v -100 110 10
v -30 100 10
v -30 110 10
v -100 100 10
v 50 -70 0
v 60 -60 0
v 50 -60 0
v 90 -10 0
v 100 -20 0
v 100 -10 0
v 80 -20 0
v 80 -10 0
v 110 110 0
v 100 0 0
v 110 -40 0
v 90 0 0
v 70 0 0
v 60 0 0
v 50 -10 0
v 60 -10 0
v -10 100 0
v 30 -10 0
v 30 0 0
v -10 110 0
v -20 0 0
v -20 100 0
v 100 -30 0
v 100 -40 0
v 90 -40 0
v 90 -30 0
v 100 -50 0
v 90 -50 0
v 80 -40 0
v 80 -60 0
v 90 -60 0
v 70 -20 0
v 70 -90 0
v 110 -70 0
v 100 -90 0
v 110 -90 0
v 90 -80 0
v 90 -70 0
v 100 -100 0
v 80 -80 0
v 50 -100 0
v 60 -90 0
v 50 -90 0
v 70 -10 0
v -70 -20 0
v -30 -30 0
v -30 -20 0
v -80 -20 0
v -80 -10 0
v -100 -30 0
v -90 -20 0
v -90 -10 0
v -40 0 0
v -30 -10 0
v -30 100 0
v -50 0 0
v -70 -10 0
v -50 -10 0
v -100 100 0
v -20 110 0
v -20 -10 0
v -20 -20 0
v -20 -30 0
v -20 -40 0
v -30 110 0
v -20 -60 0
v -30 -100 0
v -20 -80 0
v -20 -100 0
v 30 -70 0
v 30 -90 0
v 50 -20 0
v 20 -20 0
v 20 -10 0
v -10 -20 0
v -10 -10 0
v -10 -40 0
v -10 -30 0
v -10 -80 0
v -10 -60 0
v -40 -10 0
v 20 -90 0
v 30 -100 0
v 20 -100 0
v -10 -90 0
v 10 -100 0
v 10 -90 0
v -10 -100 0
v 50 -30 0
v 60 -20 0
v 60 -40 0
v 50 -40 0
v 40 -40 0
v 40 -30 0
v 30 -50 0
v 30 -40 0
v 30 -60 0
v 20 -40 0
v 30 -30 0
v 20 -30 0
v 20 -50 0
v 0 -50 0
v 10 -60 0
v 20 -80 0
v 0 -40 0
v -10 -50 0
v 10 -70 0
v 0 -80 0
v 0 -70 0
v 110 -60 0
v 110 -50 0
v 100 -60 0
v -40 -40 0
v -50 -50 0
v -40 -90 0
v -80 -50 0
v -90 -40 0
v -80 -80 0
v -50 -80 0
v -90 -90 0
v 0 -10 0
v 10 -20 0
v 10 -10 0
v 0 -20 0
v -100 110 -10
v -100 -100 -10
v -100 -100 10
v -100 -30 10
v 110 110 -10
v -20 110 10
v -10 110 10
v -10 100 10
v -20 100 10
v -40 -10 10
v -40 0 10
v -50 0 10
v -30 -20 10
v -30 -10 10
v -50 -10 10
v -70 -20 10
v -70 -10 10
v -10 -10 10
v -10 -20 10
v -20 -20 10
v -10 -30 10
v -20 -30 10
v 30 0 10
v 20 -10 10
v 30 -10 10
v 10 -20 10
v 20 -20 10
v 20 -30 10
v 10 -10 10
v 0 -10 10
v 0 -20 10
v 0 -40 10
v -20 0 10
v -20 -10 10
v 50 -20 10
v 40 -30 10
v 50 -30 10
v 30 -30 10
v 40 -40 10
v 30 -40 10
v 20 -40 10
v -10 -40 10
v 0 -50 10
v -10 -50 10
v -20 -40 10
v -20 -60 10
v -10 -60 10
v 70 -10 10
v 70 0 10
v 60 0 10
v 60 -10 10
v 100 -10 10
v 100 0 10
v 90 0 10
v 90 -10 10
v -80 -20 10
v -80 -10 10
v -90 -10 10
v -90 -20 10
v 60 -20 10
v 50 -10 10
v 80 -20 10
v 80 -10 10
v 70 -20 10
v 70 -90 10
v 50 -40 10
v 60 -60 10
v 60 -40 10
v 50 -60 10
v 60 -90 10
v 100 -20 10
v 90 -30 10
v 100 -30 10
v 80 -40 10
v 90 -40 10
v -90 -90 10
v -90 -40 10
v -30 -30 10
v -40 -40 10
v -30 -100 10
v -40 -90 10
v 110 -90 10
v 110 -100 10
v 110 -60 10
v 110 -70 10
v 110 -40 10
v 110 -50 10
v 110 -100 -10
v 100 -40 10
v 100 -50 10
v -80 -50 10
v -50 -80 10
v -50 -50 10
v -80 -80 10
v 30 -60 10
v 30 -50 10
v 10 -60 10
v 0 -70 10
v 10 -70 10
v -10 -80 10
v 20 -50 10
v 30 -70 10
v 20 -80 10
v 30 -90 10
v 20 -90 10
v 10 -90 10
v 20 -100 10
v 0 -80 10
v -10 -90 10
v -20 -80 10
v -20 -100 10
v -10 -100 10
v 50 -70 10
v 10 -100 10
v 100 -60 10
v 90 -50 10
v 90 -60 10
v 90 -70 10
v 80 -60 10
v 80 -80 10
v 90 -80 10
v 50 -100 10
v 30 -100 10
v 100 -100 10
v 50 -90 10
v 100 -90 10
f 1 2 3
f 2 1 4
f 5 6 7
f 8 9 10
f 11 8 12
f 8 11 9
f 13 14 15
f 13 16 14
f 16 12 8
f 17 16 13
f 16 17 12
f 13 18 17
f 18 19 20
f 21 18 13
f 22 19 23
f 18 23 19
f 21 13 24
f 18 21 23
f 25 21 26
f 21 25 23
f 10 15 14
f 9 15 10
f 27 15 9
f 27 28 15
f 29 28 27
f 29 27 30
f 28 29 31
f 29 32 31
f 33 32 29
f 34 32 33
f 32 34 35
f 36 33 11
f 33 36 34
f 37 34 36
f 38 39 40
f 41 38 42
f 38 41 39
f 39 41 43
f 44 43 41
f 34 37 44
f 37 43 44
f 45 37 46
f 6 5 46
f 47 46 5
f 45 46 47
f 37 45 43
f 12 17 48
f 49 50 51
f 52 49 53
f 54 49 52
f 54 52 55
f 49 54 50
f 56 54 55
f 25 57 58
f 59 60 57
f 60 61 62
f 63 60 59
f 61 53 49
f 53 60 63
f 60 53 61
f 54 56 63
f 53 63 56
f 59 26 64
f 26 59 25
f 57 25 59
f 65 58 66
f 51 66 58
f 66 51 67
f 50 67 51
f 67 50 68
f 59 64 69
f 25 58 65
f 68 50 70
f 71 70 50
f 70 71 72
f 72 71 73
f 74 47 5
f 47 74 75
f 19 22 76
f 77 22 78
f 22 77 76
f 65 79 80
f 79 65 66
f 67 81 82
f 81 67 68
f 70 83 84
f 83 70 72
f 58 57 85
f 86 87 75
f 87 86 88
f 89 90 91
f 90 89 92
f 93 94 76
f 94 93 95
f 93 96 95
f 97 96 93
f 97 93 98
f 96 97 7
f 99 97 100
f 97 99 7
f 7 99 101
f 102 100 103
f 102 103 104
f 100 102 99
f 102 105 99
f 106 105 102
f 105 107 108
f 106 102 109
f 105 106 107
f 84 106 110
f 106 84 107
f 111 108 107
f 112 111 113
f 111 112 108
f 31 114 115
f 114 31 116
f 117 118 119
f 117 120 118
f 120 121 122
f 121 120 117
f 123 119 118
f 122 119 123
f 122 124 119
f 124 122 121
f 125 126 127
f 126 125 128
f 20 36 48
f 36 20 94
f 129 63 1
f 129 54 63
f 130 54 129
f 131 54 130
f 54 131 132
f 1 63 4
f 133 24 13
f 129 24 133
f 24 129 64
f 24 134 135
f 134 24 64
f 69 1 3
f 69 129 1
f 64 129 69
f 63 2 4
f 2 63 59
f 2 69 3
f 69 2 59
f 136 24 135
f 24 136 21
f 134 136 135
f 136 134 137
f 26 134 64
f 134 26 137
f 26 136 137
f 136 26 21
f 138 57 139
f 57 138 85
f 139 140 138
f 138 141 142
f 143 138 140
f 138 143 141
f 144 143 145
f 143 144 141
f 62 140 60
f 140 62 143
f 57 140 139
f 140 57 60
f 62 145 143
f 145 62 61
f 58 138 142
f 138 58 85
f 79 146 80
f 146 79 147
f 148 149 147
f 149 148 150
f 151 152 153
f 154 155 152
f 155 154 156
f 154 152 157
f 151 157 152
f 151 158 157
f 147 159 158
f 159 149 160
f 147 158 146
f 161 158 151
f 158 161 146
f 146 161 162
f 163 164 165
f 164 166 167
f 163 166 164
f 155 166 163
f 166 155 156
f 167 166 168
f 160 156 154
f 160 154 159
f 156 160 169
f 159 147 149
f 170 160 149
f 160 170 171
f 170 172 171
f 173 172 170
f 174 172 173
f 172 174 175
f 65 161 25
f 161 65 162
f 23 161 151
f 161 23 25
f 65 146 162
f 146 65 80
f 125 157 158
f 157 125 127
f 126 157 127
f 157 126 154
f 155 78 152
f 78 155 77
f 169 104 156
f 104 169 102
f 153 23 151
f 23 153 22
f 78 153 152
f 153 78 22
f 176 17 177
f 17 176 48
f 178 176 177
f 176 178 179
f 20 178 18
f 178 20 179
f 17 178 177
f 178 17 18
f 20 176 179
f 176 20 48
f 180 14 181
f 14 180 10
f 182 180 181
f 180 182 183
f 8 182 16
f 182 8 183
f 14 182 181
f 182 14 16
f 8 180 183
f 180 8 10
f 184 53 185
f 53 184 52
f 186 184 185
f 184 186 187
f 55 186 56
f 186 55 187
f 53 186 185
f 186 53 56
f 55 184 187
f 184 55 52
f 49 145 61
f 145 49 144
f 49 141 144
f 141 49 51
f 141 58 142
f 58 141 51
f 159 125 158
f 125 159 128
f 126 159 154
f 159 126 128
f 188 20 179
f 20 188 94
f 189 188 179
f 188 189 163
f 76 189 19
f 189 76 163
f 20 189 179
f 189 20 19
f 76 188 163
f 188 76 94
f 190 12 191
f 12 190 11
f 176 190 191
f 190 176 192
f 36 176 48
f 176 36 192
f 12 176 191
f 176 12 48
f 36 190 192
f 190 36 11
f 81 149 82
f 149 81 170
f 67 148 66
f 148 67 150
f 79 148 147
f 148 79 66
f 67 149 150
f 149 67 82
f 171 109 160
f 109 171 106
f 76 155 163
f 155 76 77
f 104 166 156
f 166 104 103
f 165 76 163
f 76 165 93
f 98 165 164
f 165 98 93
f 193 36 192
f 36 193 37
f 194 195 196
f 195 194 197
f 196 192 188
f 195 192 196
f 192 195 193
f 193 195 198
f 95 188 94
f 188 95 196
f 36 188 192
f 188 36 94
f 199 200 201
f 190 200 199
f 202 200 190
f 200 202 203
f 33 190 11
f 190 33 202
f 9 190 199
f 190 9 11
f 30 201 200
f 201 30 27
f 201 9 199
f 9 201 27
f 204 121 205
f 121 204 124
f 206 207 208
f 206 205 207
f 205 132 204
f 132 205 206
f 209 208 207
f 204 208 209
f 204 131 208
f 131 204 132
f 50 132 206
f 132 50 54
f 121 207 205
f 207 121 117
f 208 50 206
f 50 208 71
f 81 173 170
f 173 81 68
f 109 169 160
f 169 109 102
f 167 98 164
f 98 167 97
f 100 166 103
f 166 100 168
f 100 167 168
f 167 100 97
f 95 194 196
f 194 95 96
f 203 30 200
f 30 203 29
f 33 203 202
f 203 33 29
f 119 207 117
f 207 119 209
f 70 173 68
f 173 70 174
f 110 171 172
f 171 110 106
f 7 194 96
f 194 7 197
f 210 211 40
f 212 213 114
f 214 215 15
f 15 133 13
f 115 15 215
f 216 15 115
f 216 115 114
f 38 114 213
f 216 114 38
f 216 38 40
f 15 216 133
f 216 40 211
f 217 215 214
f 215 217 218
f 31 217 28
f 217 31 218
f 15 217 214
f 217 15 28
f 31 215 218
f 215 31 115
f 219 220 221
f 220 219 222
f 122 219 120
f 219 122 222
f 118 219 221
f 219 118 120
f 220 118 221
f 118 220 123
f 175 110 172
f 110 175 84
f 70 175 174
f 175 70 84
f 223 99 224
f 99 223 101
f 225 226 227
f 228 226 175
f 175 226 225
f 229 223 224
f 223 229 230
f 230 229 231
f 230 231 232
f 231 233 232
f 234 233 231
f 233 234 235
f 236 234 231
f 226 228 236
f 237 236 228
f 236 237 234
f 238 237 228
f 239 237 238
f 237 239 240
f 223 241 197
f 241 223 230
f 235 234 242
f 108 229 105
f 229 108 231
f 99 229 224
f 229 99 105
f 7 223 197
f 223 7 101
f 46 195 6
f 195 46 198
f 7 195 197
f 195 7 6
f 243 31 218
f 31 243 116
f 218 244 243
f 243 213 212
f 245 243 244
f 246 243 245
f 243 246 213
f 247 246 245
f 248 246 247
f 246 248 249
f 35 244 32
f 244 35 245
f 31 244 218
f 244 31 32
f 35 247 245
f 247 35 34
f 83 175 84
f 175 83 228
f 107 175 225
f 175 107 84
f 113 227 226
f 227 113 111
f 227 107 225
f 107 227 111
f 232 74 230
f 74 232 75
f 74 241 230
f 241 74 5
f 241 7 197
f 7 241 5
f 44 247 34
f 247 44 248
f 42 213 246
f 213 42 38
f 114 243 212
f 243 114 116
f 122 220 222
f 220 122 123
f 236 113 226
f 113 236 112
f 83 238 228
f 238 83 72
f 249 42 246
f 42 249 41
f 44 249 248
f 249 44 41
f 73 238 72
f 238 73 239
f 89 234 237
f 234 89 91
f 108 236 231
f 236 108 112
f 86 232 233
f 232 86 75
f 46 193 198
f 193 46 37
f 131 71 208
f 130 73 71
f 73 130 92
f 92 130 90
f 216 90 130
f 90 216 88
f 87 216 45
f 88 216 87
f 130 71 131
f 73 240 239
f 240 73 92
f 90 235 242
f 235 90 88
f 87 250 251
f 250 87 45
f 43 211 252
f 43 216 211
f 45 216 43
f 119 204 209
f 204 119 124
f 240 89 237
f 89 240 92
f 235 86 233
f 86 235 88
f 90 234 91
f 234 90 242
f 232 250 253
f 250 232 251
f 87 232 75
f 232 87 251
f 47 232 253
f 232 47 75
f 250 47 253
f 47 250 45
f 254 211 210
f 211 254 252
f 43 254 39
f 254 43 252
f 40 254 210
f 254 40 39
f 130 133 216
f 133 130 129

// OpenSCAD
qr_size=21;module qrcode() {
    translate([-10, 10, 0])cube([1, 1, 1]);
    translate([-9, 10, 0])cube([1, 1, 1]);
    translate([-8, 10, 0])cube([1, 1, 1]);
    translate([-7, 10, 0])cube([1, 1, 1]);
    translate([-6, 10, 0])cube([1, 1, 1]);
    translate([-5, 10, 0])cube([1, 1, 1]);
    translate([-4, 10, 0])cube([1, 1, 1]);
    translate([-2, 10, 0])cube([1, 1, 1]);
    translate([-5, -1, 0])cube([1, 1, 1]);
    translate([-2, -1, 0])cube([1, 1, 1]);
    translate([-1, -1, 0])cube([1, 1, 1]);
    translate([0, -1, 0])cube([1, 1, 1]);
    translate([1, -1, 0])cube([1, 1, 1]);
    translate([2, -1, 0])cube([1, 1, 1]);
    translate([6, -1, 0])cube([1, 1, 1]);
    translate([9, -1, 0])cube([1, 1, 1]);
    translate([-9, -2, 0])cube([1, 1, 1]);
    translate([-7, -2, 0])cube([1, 1, 1]);
    translate([-6, -2, 0])cube([1, 1, 1]);
    translate([-5, -2, 0])cube([1, 1, 1]);
    translate([-4, -2, 0])cube([1, 1, 1]);
    translate([-1, -2, 0])cube([1, 1, 1]);
    translate([1, -2, 0])cube([1, 1, 1]);
    translate([5, -2, 0])cube([1, 1, 1]);
    translate([7, -2, 0])cube([1, 1, 1]);
    translate([-2, -3, 0])cube([1, 1, 1]);
    translate([-1, -3, 0])cube([1, 1, 1]);
    translate([0, -3, 0])cube([1, 1, 1]);
    translate([1, -3, 0])cube([1, 1, 1]);
    translate([2, -3, 0])cube([1, 1, 1]);
    translate([3, -3, 0])cube([1, 1, 1]);
    translate([4, -3, 0])cube([1, 1, 1]);
    translate([6, -3, 0])cube([1, 1, 1]);
    translate([8, -3, 0])cube([1, 1, 1]);
    translate([9, -3, 0])cube([1, 1, 1]);
    translate([-10, -4, 0])cube([1, 1, 1]);
    translate([-9, -4, 0])cube([1, 1, 1]);
    translate([-8, -4, 0])cube([1, 1, 1]);
    translate([-7, -4, 0])cube([1, 1, 1]);
    translate([-6, -4, 0])cube([1, 1, 1]);
    translate([-5, -4, 0])cube([1, 1, 1]);
    translate([-4, -4, 0])cube([1, 1, 1]);
    translate([-1, -4, 0])cube([1, 1, 1]);
    translate([0, -4, 0])cube([1, 1, 1]);
    translate([1, -4, 0])cube([1, 1, 1]);
    translate([3, -4, 0])cube([1, 1, 1]);
    translate([6, -4, 0])cube([1, 1, 1]);
    translate([8, -4, 0])cube([1, 1, 1]);
    translate([-10, -5, 0])cube([1, 1, 1]);
    translate([-4, -5, 0])cube([1, 1, 1]);
    translate([-2, -5, 0])cube([1, 1, 1]);
    translate([-1, -5, 0])cube([1, 1, 1]);
    translate([5, -5, 0])cube([1, 1, 1]);
    translate([6, -5, 0])cube([1, 1, 1]);
    translate([10, -5, 0])cube([1, 1, 1]);
    translate([-10, -6, 0])cube([1, 1, 1]);
    translate([-8, -6, 0])cube([1, 1, 1]);
    translate([-7, -6, 0])cube([1, 1, 1]);
    translate([-6, -6, 0])cube([1, 1, 1]);
    translate([-4, -6, 0])cube([1, 1, 1]);
    translate([-2, -6, 0])cube([1, 1, 1]);
    translate([2, -6, 0])cube([1, 1, 1]);
    translate([5, -6, 0])cube([1, 1, 1]);
    translate([6, -6, 0])cube([1, 1, 1]);
    translate([9, -6, 0])cube([1, 1, 1]);
    translate([-10, -7, 0])cube([1, 1, 1]);
    translate([-8, -7, 0])cube([1, 1, 1]);
    translate([-7, -7, 0])cube([1, 1, 1]);
    translate([-6, -7, 0])cube([1, 1, 1]);
    translate([-4, -7, 0])cube([1, 1, 1]);
    translate([-1, -7, 0])cube([1, 1, 1]);
    translate([0, -7, 0])cube([1, 1, 1]);
    translate([2, -7, 0])cube([1, 1, 1]);
    translate([3, -7, 0])cube([1, 1, 1]);
    translate([4, -7, 0])cube([1, 1, 1]);
    translate([6, -7, 0])cube([1, 1, 1]);
    translate([8, -7, 0])cube([1, 1, 1]);
    translate([9, -7, 0])cube([1, 1, 1]);
    translate([10, -7, 0])cube([1, 1, 1]);
    translate([-10, -8, 0])cube([1, 1, 1]);
    translate([-8, -8, 0])cube([1, 1, 1]);
    translate([-7, -8, 0])cube([1, 1, 1]);
    translate([-6, -8, 0])cube([1, 1, 1]);
    translate([-4, -8, 0])cube([1, 1, 1]);
    translate([-1, -8, 0])cube([1, 1, 1]);
    translate([2, -8, 0])cube([1, 1, 1]);
    translate([6, -8, 0])cube([1, 1, 1]);
    translate([8, -8, 0])cube([1, 1, 1]);
    translate([-10, -9, 0])cube([1, 1, 1]);
    translate([-4, -9, 0])cube([1, 1, 1]);
    translate([-2, -9, 0])cube([1, 1, 1]);
    translate([-1, -9, 0])cube([1, 1, 1]);
    translate([0, -9, 0])cube([1, 1, 1]);
    translate([1, -9, 0])cube([1, 1, 1]);
    translate([2, -9, 0])cube([1, 1, 1]);
    translate([6, -9, 0])cube([1, 1, 1]);
    translate([-10, -10, 0])cube([1, 1, 1]);
    translate([-9, -10, 0])cube([1, 1, 1]);
    translate([-8, -10, 0])cube([1, 1, 1]);
    translate([-7, -10, 0])cube([1, 1, 1]);
    translate([-6, -10, 0])cube([1, 1, 1]);
    translate([-5, -10, 0])cube([1, 1, 1]);
    translate([-4, -10, 0])cube([1, 1, 1]);
    translate([-2, -10, 0])cube([1, 1, 1]);
    translate([1, -10, 0])cube([1, 1, 1]);
    translate([3, -10, 0])cube([1, 1, 1]);
    translate([4, -10, 0])cube([1, 1, 1]);
    translate([10, -10, 0])cube([1, 1, 1]);
}
scale([10,10,10]){ union(){ qrcode(); translate([-10, -10, -1]) cube([qr_size,qr_size,1]); }}
